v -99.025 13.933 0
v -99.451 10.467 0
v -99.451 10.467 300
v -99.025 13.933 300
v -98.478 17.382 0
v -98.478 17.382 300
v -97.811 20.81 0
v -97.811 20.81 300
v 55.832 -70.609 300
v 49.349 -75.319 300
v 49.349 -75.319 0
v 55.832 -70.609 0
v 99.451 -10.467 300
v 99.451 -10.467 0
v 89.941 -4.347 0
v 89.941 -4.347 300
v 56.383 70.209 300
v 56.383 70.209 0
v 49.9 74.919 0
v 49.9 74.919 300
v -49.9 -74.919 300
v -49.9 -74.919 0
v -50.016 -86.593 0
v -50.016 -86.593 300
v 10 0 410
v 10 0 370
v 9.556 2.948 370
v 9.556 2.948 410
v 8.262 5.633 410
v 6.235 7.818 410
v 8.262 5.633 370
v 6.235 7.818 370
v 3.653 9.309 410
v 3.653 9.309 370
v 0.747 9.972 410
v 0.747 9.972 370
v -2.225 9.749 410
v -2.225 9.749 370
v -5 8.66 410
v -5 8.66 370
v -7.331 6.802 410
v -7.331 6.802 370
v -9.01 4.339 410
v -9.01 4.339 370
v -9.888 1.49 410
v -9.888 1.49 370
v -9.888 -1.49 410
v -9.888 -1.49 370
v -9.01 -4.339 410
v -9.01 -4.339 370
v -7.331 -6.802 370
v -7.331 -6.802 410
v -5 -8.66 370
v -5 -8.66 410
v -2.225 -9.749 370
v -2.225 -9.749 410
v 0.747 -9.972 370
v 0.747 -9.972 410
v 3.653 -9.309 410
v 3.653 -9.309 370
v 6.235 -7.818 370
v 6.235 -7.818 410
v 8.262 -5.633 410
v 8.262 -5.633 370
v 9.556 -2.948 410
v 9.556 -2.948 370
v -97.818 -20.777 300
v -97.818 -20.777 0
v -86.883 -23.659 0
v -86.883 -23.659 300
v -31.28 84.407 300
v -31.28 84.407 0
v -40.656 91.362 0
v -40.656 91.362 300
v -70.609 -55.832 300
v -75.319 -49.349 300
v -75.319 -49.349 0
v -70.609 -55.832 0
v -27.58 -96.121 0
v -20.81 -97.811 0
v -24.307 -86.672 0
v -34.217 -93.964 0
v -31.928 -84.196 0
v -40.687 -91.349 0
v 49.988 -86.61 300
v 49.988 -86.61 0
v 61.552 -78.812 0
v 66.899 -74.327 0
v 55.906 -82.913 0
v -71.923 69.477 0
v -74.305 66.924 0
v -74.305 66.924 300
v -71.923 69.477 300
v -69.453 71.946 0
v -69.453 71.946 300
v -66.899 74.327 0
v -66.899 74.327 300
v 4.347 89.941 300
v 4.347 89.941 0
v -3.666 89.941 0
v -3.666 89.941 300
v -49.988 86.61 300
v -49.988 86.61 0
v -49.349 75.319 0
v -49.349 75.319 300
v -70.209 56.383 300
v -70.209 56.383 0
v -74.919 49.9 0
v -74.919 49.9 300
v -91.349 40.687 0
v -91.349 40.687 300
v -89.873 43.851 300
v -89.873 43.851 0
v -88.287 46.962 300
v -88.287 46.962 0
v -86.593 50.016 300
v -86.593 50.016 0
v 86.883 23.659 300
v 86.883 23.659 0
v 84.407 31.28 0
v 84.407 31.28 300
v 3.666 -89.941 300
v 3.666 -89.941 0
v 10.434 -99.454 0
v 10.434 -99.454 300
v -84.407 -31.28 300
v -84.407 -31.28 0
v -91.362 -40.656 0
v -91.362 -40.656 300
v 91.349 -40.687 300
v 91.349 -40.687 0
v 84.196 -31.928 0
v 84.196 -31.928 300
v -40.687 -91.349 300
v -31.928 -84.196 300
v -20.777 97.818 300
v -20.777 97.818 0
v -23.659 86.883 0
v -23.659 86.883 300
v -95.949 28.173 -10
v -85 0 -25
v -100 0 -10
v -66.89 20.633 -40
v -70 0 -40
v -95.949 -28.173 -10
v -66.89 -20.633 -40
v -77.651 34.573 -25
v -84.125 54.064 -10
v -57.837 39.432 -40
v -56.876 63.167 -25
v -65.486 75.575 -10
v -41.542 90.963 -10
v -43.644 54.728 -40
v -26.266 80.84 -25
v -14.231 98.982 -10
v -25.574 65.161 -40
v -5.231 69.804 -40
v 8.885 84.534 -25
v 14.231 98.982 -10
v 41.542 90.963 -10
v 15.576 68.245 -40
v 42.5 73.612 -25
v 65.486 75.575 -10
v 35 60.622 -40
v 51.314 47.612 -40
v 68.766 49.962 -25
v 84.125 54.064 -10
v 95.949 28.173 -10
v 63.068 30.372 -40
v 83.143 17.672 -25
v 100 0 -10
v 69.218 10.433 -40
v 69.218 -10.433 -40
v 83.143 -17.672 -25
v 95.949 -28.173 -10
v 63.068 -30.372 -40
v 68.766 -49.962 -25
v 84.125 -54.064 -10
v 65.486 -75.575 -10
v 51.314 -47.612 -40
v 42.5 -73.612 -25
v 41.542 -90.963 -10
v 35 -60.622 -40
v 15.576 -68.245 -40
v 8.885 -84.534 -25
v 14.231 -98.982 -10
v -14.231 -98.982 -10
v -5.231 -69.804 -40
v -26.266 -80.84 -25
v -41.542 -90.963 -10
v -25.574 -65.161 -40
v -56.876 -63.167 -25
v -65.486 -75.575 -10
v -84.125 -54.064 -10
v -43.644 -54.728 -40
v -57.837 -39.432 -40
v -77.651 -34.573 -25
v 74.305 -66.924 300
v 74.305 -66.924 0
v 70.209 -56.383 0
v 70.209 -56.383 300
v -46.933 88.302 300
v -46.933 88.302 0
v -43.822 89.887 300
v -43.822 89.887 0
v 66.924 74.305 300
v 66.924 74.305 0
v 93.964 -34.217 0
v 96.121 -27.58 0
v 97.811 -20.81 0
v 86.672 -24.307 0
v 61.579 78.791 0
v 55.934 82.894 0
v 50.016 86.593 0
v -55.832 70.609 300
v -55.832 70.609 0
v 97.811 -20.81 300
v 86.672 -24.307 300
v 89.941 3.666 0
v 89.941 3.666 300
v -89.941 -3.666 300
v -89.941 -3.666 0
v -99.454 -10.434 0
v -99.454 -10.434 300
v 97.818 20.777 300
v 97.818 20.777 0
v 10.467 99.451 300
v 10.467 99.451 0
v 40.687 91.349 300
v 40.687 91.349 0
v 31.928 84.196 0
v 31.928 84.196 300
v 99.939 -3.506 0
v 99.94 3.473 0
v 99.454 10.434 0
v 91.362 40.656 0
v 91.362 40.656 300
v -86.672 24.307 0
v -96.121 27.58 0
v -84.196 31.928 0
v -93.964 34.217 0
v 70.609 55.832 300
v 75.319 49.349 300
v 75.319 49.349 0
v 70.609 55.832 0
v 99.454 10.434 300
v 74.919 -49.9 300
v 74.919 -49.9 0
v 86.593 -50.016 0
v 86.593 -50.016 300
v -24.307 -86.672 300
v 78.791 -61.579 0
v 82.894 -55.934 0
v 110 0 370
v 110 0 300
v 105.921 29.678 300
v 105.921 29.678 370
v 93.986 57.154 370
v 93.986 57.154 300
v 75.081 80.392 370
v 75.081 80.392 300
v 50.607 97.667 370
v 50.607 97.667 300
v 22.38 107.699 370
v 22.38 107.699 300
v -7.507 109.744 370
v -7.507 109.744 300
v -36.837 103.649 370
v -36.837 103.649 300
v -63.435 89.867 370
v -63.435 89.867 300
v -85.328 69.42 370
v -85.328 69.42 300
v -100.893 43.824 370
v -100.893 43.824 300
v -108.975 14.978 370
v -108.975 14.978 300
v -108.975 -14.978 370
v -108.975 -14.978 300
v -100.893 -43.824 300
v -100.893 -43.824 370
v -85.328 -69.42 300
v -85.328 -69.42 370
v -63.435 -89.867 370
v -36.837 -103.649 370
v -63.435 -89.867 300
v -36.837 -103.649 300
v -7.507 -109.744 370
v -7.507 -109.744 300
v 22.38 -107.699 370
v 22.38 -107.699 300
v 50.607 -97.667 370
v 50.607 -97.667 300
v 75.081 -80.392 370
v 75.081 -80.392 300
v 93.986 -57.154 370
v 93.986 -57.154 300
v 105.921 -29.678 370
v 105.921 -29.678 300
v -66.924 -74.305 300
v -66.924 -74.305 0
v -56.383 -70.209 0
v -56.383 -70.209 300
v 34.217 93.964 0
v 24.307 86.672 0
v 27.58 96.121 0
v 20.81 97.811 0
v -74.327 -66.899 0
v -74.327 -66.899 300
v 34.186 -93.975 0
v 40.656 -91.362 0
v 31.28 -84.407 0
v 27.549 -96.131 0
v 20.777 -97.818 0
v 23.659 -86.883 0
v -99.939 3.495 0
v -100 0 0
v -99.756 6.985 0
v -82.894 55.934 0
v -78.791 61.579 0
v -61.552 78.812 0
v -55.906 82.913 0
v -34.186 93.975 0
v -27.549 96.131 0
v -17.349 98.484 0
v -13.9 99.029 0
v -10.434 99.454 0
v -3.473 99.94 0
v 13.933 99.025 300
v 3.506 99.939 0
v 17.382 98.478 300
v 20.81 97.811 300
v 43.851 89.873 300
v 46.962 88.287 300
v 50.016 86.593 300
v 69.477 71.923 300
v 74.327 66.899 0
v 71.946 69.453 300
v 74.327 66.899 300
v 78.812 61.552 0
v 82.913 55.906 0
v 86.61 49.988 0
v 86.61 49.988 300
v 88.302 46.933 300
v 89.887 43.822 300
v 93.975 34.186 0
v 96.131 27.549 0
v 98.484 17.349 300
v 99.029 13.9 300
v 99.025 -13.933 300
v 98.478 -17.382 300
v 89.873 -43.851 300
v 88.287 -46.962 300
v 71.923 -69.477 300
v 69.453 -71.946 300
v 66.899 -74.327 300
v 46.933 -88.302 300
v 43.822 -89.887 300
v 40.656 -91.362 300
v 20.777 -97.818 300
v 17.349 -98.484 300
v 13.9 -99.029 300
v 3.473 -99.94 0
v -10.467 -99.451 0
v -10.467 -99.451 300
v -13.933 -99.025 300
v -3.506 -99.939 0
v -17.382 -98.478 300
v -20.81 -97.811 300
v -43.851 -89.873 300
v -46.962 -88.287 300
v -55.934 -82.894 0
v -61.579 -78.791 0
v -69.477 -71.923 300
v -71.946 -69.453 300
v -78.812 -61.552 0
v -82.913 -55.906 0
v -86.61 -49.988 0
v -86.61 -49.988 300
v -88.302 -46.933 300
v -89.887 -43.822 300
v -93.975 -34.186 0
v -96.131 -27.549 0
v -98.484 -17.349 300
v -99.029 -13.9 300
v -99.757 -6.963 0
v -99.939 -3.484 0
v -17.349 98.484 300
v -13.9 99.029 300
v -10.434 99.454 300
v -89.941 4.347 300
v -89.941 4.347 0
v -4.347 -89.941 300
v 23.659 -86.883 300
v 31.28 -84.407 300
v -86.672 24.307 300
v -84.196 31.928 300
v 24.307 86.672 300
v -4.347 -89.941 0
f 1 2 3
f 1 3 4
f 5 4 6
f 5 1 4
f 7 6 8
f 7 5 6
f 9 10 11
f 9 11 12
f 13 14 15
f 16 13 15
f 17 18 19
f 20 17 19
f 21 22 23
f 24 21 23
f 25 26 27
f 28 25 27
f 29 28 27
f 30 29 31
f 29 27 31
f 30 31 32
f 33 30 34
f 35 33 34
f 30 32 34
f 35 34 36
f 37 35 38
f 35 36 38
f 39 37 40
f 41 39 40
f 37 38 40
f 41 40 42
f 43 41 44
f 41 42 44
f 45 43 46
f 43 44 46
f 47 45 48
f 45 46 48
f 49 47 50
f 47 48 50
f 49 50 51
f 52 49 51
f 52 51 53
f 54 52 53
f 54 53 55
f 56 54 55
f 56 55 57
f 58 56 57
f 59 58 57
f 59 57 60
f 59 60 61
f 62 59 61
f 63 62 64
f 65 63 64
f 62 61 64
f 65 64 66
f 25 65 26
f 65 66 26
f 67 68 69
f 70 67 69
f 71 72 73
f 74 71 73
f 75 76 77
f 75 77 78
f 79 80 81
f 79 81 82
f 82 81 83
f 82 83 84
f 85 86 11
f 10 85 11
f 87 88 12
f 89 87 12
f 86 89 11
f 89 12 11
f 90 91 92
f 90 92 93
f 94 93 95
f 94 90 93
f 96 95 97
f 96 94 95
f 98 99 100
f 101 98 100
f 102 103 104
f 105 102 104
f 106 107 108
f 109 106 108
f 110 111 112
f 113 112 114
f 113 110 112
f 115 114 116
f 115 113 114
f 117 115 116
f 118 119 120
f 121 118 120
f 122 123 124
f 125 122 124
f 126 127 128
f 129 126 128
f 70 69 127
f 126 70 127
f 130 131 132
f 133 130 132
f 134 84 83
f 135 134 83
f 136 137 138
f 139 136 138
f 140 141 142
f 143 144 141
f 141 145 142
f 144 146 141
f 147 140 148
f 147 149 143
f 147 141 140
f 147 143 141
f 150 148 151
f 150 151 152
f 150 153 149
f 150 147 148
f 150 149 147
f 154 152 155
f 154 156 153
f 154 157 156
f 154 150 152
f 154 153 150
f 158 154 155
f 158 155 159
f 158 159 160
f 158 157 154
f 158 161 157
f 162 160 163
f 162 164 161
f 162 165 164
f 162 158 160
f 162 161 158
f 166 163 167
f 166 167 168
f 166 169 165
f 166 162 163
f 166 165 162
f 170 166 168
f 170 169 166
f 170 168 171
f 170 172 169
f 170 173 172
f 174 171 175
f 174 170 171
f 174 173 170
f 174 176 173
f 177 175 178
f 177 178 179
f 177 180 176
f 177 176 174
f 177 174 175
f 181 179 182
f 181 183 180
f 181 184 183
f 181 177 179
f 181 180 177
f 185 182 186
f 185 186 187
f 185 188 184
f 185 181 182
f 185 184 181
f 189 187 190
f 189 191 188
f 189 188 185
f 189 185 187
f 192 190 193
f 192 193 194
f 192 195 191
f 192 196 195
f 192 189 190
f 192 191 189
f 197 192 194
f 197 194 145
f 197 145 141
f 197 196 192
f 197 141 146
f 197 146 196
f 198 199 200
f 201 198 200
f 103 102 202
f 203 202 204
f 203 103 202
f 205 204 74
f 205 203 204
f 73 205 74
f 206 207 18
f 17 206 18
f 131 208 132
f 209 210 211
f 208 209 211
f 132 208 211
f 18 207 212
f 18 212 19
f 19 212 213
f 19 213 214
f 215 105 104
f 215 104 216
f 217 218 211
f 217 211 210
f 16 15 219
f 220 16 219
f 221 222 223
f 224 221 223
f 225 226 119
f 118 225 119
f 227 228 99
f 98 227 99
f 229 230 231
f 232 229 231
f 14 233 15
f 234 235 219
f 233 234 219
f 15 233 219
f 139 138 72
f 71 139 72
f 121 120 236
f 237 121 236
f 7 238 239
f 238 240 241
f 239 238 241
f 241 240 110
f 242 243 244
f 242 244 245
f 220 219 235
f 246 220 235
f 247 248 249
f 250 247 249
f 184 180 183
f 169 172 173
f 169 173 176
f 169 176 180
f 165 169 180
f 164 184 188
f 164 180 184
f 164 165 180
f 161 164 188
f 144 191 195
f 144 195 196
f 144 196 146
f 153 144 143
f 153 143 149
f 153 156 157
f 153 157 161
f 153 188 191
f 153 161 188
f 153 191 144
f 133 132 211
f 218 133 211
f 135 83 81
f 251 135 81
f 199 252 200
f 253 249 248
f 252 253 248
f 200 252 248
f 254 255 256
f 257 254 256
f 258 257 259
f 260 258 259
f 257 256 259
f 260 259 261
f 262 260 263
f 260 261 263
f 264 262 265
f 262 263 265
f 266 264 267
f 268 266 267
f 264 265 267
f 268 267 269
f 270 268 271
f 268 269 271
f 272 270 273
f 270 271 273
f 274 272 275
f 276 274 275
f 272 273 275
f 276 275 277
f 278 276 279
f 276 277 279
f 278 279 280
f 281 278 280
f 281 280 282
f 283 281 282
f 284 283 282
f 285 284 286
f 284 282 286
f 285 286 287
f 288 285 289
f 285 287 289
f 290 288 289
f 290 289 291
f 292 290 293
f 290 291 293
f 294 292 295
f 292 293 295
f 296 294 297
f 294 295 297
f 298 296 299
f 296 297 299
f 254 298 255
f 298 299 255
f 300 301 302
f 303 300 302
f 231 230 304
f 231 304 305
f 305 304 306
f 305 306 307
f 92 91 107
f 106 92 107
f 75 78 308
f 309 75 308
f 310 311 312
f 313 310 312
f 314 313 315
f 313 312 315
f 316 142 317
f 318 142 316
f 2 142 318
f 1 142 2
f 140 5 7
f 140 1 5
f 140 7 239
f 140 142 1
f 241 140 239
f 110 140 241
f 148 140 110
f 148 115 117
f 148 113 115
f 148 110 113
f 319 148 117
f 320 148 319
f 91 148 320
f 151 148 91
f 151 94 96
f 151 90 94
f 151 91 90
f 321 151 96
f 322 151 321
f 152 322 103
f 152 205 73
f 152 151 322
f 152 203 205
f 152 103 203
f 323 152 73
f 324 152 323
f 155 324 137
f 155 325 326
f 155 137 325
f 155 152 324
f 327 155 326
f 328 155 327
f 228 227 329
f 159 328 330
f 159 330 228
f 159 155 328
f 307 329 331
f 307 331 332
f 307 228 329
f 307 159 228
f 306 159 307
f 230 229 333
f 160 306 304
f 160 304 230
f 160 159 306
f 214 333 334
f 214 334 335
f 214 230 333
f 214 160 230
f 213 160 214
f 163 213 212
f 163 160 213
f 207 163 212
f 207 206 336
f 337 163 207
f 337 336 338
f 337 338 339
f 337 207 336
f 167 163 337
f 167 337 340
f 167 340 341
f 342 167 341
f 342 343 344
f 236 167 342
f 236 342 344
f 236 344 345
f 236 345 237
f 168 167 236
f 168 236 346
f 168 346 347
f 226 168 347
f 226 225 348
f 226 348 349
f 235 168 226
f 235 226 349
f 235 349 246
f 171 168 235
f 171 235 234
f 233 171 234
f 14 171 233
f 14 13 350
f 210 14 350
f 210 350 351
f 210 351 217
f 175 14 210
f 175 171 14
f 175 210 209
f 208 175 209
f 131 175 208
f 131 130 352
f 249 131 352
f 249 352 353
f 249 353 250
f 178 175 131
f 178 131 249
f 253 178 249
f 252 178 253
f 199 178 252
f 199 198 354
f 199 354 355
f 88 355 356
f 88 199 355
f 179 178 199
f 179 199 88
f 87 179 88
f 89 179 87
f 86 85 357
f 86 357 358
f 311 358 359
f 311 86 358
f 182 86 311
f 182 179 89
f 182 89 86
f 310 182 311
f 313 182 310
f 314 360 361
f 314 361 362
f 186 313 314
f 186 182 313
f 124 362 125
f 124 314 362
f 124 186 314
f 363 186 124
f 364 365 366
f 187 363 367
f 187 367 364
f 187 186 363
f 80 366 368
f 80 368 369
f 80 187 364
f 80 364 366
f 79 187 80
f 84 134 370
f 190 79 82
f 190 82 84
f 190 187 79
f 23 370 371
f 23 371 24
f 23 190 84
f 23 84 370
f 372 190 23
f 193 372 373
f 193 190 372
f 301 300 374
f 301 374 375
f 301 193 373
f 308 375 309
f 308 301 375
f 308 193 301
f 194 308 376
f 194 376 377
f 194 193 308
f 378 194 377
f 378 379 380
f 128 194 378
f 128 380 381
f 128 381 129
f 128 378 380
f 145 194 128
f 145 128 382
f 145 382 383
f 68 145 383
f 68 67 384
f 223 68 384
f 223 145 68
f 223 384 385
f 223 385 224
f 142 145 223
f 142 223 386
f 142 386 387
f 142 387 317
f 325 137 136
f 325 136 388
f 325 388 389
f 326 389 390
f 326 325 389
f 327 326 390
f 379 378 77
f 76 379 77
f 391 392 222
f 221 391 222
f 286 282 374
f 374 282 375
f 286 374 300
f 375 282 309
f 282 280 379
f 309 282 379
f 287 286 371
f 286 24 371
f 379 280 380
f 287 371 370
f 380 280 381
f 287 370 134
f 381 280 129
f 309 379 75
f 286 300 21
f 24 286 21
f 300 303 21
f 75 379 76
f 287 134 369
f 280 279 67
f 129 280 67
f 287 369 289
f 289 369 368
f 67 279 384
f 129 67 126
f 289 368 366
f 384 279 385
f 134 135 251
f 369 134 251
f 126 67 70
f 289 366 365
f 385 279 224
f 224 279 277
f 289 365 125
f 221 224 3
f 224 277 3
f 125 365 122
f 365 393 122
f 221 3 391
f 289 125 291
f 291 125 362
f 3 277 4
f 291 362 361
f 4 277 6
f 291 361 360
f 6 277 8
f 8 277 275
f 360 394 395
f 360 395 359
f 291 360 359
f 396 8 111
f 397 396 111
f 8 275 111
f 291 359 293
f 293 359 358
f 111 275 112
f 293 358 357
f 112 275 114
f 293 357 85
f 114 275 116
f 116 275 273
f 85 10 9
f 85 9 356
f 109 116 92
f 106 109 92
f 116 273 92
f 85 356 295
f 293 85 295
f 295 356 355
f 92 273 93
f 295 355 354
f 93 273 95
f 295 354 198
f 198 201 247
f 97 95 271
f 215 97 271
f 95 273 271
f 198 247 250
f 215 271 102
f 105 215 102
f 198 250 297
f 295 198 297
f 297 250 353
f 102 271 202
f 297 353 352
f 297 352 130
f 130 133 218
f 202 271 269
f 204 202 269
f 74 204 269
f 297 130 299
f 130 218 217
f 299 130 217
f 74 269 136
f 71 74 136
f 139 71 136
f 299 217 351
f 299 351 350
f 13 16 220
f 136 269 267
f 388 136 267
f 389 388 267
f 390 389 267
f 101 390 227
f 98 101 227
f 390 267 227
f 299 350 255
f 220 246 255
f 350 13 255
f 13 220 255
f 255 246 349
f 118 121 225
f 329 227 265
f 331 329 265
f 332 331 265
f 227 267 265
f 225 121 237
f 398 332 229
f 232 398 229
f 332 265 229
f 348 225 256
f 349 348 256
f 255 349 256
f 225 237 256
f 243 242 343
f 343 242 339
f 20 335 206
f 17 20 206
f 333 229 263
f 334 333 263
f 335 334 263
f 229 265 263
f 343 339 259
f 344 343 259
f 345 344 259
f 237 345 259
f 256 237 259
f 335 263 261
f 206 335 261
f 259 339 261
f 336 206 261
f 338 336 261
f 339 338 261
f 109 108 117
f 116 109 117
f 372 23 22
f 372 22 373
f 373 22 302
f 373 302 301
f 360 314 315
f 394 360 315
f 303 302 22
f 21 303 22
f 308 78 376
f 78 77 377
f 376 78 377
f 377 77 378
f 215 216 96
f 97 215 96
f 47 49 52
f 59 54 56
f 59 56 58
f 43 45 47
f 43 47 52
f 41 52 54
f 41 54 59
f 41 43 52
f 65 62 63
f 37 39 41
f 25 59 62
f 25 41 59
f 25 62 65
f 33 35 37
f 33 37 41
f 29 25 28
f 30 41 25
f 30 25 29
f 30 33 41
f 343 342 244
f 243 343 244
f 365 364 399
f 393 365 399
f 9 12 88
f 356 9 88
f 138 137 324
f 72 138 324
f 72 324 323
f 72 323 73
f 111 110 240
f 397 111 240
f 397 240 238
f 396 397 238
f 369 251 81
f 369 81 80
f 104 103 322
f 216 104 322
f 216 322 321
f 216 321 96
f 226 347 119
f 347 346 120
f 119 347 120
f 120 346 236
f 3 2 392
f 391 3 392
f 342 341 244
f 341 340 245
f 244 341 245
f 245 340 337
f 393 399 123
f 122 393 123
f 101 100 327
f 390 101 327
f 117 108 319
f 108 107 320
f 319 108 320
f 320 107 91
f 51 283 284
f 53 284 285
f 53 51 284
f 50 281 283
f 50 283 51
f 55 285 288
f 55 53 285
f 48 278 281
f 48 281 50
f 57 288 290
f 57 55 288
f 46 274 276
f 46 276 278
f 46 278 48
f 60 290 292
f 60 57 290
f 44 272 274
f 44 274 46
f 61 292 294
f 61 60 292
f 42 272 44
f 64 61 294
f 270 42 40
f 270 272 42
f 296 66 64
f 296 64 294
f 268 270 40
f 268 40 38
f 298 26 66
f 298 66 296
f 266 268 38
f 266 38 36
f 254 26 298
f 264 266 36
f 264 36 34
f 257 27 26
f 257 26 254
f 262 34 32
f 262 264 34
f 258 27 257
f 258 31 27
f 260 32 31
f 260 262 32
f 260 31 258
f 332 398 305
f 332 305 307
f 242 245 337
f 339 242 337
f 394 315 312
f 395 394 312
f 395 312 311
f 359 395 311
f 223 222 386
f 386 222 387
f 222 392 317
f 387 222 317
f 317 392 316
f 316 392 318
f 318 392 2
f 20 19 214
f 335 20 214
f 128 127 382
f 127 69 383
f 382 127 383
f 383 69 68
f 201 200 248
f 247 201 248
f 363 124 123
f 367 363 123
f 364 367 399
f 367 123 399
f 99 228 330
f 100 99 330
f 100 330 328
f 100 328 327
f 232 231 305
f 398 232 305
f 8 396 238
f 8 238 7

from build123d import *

# Parameters (mm, degrees)
SKETCH1_R           = 100
BOSS_EXTRUDE1_DEPTH = 300
CUT_EXTRUDE1_REACH  = 333.662
BOSS_EXTRUDE3_START = 40
SKETCH4_R           = 100
BOSS_EXTRUDE3_DEPTH = 40
CHAMFER1_SIZE       = 30
SKETCH5_R           = 110
BOSS_EXTRUDE4_DEPTH = 70
SKETCH6_R           = 10
BOSS_EXTRUDE5_DEPTH = 40


with BuildPart() as part:
    # Sketch1 → Boss-Extrude1 (new body)
    with BuildSketch(Plane.XY):
        Circle(SKETCH1_R)
    extrude(amount=BOSS_EXTRUDE1_DEPTH)

    # Sketch3 → Cut-Extrude1 (cut, up to next)
    with BuildSketch(Plane(origin=(0, 0, 0), x_dir=(-1, 0, 0), z_dir=(0, 0, -1)), mode=Mode.PRIVATE) as cut_extrude1_sk1:
        with BuildLine():
            Line((-10.46691071, 99.450710305), (-4.346948216, 89.941443019))
            Line((-4.346948216, 89.941443019), (3.66602129, 89.941443019))
            Line((3.66602129, 89.941443019), (10.434028252, 99.454165596))
            ThreePointArc((10.434028252, 99.454165596), (-0.01653175, 99.999998634), (-10.46691071, 99.450710305))
        make_face()
    cut_extrude1_tool1 = extrude(cut_extrude1_sk1.sketch, amount=-CUT_EXTRUDE1_REACH, mode=Mode.PRIVATE) & part.part
    # Sketch3 → Cut-Extrude1 (cut, up to next)
    with BuildSketch(Plane(origin=(0, 0, 0), x_dir=(-1, 0, 0), z_dir=(0, 0, -1)), mode=Mode.PRIVATE) as cut_extrude1_sk2:
        with BuildLine():
            Line((20.777335951, 97.817699374), (23.659240965, 86.88267634))
            Line((23.659240965, 86.88267634), (31.280027828, 84.406532588))
            Line((31.280027828, 84.406532588), (40.656377891, 91.362240213))
            ThreePointArc((40.656377891, 91.362240213), (30.885976386, 95.110758922), (20.777335951, 97.817699374))
        make_face()
    cut_extrude1_tool2 = extrude(cut_extrude1_sk2.sketch, amount=-CUT_EXTRUDE1_REACH, mode=Mode.PRIVATE) & part.part
    # Sketch3 → Cut-Extrude1 (cut, up to next)
    with BuildSketch(Plane(origin=(0, 0, 0), x_dir=(-1, 0, 0), z_dir=(0, 0, -1)), mode=Mode.PRIVATE) as cut_extrude1_sk3:
        with BuildLine():
            Line((49.987752204, 86.609610492), (49.349498796, 75.319227955))
            Line((49.349498796, 75.319227955), (55.832127301, 70.609322652))
            Line((55.832127301, 70.609322652), (66.898997992, 74.3271422))
            ThreePointArc((66.898997992, 74.3271422), (58.765149959, 80.911415451), (49.987752204, 86.609610492))
        make_face()
    cut_extrude1_tool3 = extrude(cut_extrude1_sk3.sketch, amount=-CUT_EXTRUDE1_REACH, mode=Mode.PRIVATE) & part.part
    # Sketch3 → Cut-Extrude1 (cut, up to next)
    with BuildSketch(Plane(origin=(0, 0, 0), x_dir=(-1, 0, 0), z_dir=(0, 0, -1)), mode=Mode.PRIVATE) as cut_extrude1_sk4:
        with BuildLine():
            Line((74.305018987, 66.92356949), (70.209083847, 56.383008757))
            Line((70.209083847, 56.383008757), (74.918989149, 49.900380251))
            Line((74.918989149, 49.900380251), (86.593078057, 50.016385641))
            ThreePointArc((86.593078057, 50.016385641), (80.891981213, 58.791898893), (74.305018987, 66.92356949))
        make_face()
    cut_extrude1_tool4 = extrude(cut_extrude1_sk4.sketch, amount=-CUT_EXTRUDE1_REACH, mode=Mode.PRIVATE) & part.part
    # Sketch3 → Cut-Extrude1 (cut, up to next)
    with BuildSketch(Plane(origin=(0, 0, 0), x_dir=(-1, 0, 0), z_dir=(0, 0, -1)), mode=Mode.PRIVATE) as cut_extrude1_sk5:
        with BuildLine():
            Line((91.348792798, 40.686583223), (84.196114596, 31.927627818))
            Line((84.196114596, 31.927627818), (86.672258348, 24.306840955))
            Line((86.672258348, 24.306840955), (97.810824313, 20.80967677))
            ThreePointArc((97.810824313, 20.80967677), (95.100541738, 30.917421644), (91.348792798, 40.686583223))
        make_face()
    cut_extrude1_tool5 = extrude(cut_extrude1_sk5.sketch, amount=-CUT_EXTRUDE1_REACH, mode=Mode.PRIVATE) & part.part
    # Sketch3 → Cut-Extrude1 (cut, up to next)
    with BuildSketch(Plane(origin=(0, 0, 0), x_dir=(-1, 0, 0), z_dir=(0, 0, -1)), mode=Mode.PRIVATE) as cut_extrude1_sk6:
        with BuildLine():
            Line((99.450710305, 10.46691071), (89.941443019, 4.346948216))
            Line((89.941443019, 4.346948216), (89.941443019, -3.66602129))
            Line((89.941443019, -3.66602129), (99.454165596, -10.434028252))
            ThreePointArc((99.454165596, -10.434028252), (99.999998634, 0.01653175), (99.450710305, 10.46691071))
        make_face()
    cut_extrude1_tool6 = extrude(cut_extrude1_sk6.sketch, amount=-CUT_EXTRUDE1_REACH, mode=Mode.PRIVATE) & part.part
    # Sketch3 → Cut-Extrude1 (cut, up to next)
    with BuildSketch(Plane(origin=(0, 0, 0), x_dir=(-1, 0, 0), z_dir=(0, 0, -1)), mode=Mode.PRIVATE) as cut_extrude1_sk7:
        with BuildLine():
            Line((97.817699374, -20.777335951), (86.88267634, -23.659240965))
            Line((86.88267634, -23.659240965), (84.406532588, -31.280027828))
            Line((84.406532588, -31.280027828), (91.362240213, -40.656377891))
            ThreePointArc((91.362240213, -40.656377891), (95.110758922, -30.885976386), (97.817699374, -20.777335951))
        make_face()
    cut_extrude1_tool7 = extrude(cut_extrude1_sk7.sketch, amount=-CUT_EXTRUDE1_REACH, mode=Mode.PRIVATE) & part.part
    # Sketch3 → Cut-Extrude1 (cut, up to next)
    with BuildSketch(Plane(origin=(0, 0, 0), x_dir=(-1, 0, 0), z_dir=(0, 0, -1)), mode=Mode.PRIVATE) as cut_extrude1_sk8:
        with BuildLine():
            Line((86.609610492, -49.987752204), (75.319227955, -49.349498796))
            Line((75.319227955, -49.349498796), (70.609322652, -55.832127301))
            Line((70.609322652, -55.832127301), (74.3271422, -66.898997992))
            ThreePointArc((74.3271422, -66.898997992), (80.911415451, -58.765149959), (86.609610492, -49.987752204))
        make_face()
    cut_extrude1_tool8 = extrude(cut_extrude1_sk8.sketch, amount=-CUT_EXTRUDE1_REACH, mode=Mode.PRIVATE) & part.part
    # Sketch3 → Cut-Extrude1 (cut, up to next)
    with BuildSketch(Plane(origin=(0, 0, 0), x_dir=(-1, 0, 0), z_dir=(0, 0, -1)), mode=Mode.PRIVATE) as cut_extrude1_sk9:
        with BuildLine():
            Line((66.92356949, -74.305018987), (56.383008757, -70.209083847))
            Line((56.383008757, -70.209083847), (49.900380251, -74.918989149))
            Line((49.900380251, -74.918989149), (50.016385641, -86.593078057))
            ThreePointArc((50.016385641, -86.593078057), (58.791898893, -80.891981213), (66.92356949, -74.305018987))
        make_face()
    cut_extrude1_tool9 = extrude(cut_extrude1_sk9.sketch, amount=-CUT_EXTRUDE1_REACH, mode=Mode.PRIVATE) & part.part
    # Sketch3 → Cut-Extrude1 (cut, up to next)
    with BuildSketch(Plane(origin=(0, 0, 0), x_dir=(-1, 0, 0), z_dir=(0, 0, -1)), mode=Mode.PRIVATE) as cut_extrude1_sk10:
        with BuildLine():
            Line((40.686583223, -91.348792798), (31.927627818, -84.196114596))
            Line((31.927627818, -84.196114596), (24.306840955, -86.672258348))
            Line((24.306840955, -86.672258348), (20.80967677, -97.810824313))
            ThreePointArc((20.80967677, -97.810824313), (30.917421644, -95.100541738), (40.686583223, -91.348792798))
        make_face()
    cut_extrude1_tool10 = extrude(cut_extrude1_sk10.sketch, amount=-CUT_EXTRUDE1_REACH, mode=Mode.PRIVATE) & part.part
    # Sketch3 → Cut-Extrude1 (cut, up to next)
    with BuildSketch(Plane(origin=(0, 0, 0), x_dir=(-1, 0, 0), z_dir=(0, 0, -1)), mode=Mode.PRIVATE) as cut_extrude1_sk11:
        with BuildLine():
            Line((10.46691071, -99.450710305), (4.346948216, -89.941443019))
            Line((4.346948216, -89.941443019), (-3.66602129, -89.941443019))
            Line((-3.66602129, -89.941443019), (-10.434028252, -99.454165596))
            ThreePointArc((-10.434028252, -99.454165596), (0.01653175, -99.999998634), (10.46691071, -99.450710305))
        make_face()
    cut_extrude1_tool11 = extrude(cut_extrude1_sk11.sketch, amount=-CUT_EXTRUDE1_REACH, mode=Mode.PRIVATE) & part.part
    # Sketch3 → Cut-Extrude1 (cut, up to next)
    with BuildSketch(Plane(origin=(0, 0, 0), x_dir=(-1, 0, 0), z_dir=(0, 0, -1)), mode=Mode.PRIVATE) as cut_extrude1_sk12:
        with BuildLine():
            Line((-20.777335951, -97.817699374), (-23.659240965, -86.88267634))
            Line((-23.659240965, -86.88267634), (-31.280027828, -84.406532588))
            Line((-31.280027828, -84.406532588), (-40.656377891, -91.362240213))
            ThreePointArc((-40.656377891, -91.362240213), (-30.885976386, -95.110758922), (-20.777335951, -97.817699374))
        make_face()
    cut_extrude1_tool12 = extrude(cut_extrude1_sk12.sketch, amount=-CUT_EXTRUDE1_REACH, mode=Mode.PRIVATE) & part.part
    # Sketch3 → Cut-Extrude1 (cut, up to next)
    with BuildSketch(Plane(origin=(0, 0, 0), x_dir=(-1, 0, 0), z_dir=(0, 0, -1)), mode=Mode.PRIVATE) as cut_extrude1_sk13:
        with BuildLine():
            Line((-49.987752204, -86.609610492), (-49.349498796, -75.319227955))
            Line((-49.349498796, -75.319227955), (-55.832127301, -70.609322652))
            Line((-55.832127301, -70.609322652), (-66.898997992, -74.3271422))
            ThreePointArc((-66.898997992, -74.3271422), (-58.765149959, -80.911415451), (-49.987752204, -86.609610492))
        make_face()
    cut_extrude1_tool13 = extrude(cut_extrude1_sk13.sketch, amount=-CUT_EXTRUDE1_REACH, mode=Mode.PRIVATE) & part.part
    # Sketch3 → Cut-Extrude1 (cut, up to next)
    with BuildSketch(Plane(origin=(0, 0, 0), x_dir=(-1, 0, 0), z_dir=(0, 0, -1)), mode=Mode.PRIVATE) as cut_extrude1_sk14:
        with BuildLine():
            Line((-74.305018987, -66.92356949), (-70.209083847, -56.383008757))
            Line((-70.209083847, -56.383008757), (-74.918989149, -49.900380251))
            Line((-74.918989149, -49.900380251), (-86.593078057, -50.016385641))
            ThreePointArc((-86.593078057, -50.016385641), (-80.891981213, -58.791898893), (-74.305018987, -66.92356949))
        make_face()
    cut_extrude1_tool14 = extrude(cut_extrude1_sk14.sketch, amount=-CUT_EXTRUDE1_REACH, mode=Mode.PRIVATE) & part.part
    # Sketch3 → Cut-Extrude1 (cut, up to next)
    with BuildSketch(Plane(origin=(0, 0, 0), x_dir=(-1, 0, 0), z_dir=(0, 0, -1)), mode=Mode.PRIVATE) as cut_extrude1_sk15:
        with BuildLine():
            Line((-91.348792798, -40.686583223), (-84.196114596, -31.927627818))
            Line((-84.196114596, -31.927627818), (-86.672258348, -24.306840955))
            Line((-86.672258348, -24.306840955), (-97.810824313, -20.80967677))
            ThreePointArc((-97.810824313, -20.80967677), (-95.100541738, -30.917421644), (-91.348792798, -40.686583223))
        make_face()
    cut_extrude1_tool15 = extrude(cut_extrude1_sk15.sketch, amount=-CUT_EXTRUDE1_REACH, mode=Mode.PRIVATE) & part.part
    # Sketch3 → Cut-Extrude1 (cut, up to next)
    with BuildSketch(Plane(origin=(0, 0, 0), x_dir=(-1, 0, 0), z_dir=(0, 0, -1)), mode=Mode.PRIVATE) as cut_extrude1_sk16:
        with BuildLine():
            Line((-99.450710305, -10.46691071), (-89.941443019, -4.346948216))
            Line((-89.941443019, -4.346948216), (-89.941443019, 3.66602129))
            Line((-89.941443019, 3.66602129), (-99.454165596, 10.434028252))
            ThreePointArc((-99.454165596, 10.434028252), (-99.999998634, -0.01653175), (-99.450710305, -10.46691071))
        make_face()
    cut_extrude1_tool16 = extrude(cut_extrude1_sk16.sketch, amount=-CUT_EXTRUDE1_REACH, mode=Mode.PRIVATE) & part.part
    # Sketch3 → Cut-Extrude1 (cut, up to next)
    with BuildSketch(Plane(origin=(0, 0, 0), x_dir=(-1, 0, 0), z_dir=(0, 0, -1)), mode=Mode.PRIVATE) as cut_extrude1_sk17:
        with BuildLine():
            Line((-97.817699374, 20.777335951), (-86.88267634, 23.659240965))
            Line((-86.88267634, 23.659240965), (-84.406532588, 31.280027828))
            Line((-84.406532588, 31.280027828), (-91.362240213, 40.656377891))
            ThreePointArc((-91.362240213, 40.656377891), (-95.110758922, 30.885976386), (-97.817699374, 20.777335951))
        make_face()
    cut_extrude1_tool17 = extrude(cut_extrude1_sk17.sketch, amount=-CUT_EXTRUDE1_REACH, mode=Mode.PRIVATE) & part.part
    # Sketch3 → Cut-Extrude1 (cut, up to next)
    with BuildSketch(Plane(origin=(0, 0, 0), x_dir=(-1, 0, 0), z_dir=(0, 0, -1)), mode=Mode.PRIVATE) as cut_extrude1_sk18:
        with BuildLine():
            Line((-86.609610492, 49.987752204), (-75.319227955, 49.349498796))
            Line((-75.319227955, 49.349498796), (-70.609322652, 55.832127301))
            Line((-70.609322652, 55.832127301), (-74.3271422, 66.898997992))
            ThreePointArc((-74.3271422, 66.898997992), (-80.911415451, 58.765149959), (-86.609610492, 49.987752204))
        make_face()
    cut_extrude1_tool18 = extrude(cut_extrude1_sk18.sketch, amount=-CUT_EXTRUDE1_REACH, mode=Mode.PRIVATE) & part.part
    # Sketch3 → Cut-Extrude1 (cut, up to next)
    with BuildSketch(Plane(origin=(0, 0, 0), x_dir=(-1, 0, 0), z_dir=(0, 0, -1)), mode=Mode.PRIVATE) as cut_extrude1_sk19:
        with BuildLine():
            Line((-66.92356949, 74.305018987), (-56.383008757, 70.209083847))
            Line((-56.383008757, 70.209083847), (-49.900380251, 74.918989149))
            Line((-49.900380251, 74.918989149), (-50.016385641, 86.593078057))
            ThreePointArc((-50.016385641, 86.593078057), (-58.791898893, 80.891981213), (-66.92356949, 74.305018987))
        make_face()
    cut_extrude1_tool19 = extrude(cut_extrude1_sk19.sketch, amount=-CUT_EXTRUDE1_REACH, mode=Mode.PRIVATE) & part.part
    # Sketch3 → Cut-Extrude1 (cut, up to next)
    with BuildSketch(Plane(origin=(0, 0, 0), x_dir=(-1, 0, 0), z_dir=(0, 0, -1)), mode=Mode.PRIVATE) as cut_extrude1_sk20:
        with BuildLine():
            Line((-40.686583223, 91.348792798), (-31.927627818, 84.196114596))
            Line((-31.927627818, 84.196114596), (-24.306840955, 86.672258348))
            Line((-24.306840955, 86.672258348), (-20.80967677, 97.810824313))
            ThreePointArc((-20.80967677, 97.810824313), (-30.917421644, 95.100541738), (-40.686583223, 91.348792798))
        make_face()
    cut_extrude1_tool20 = extrude(cut_extrude1_sk20.sketch, amount=-CUT_EXTRUDE1_REACH, mode=Mode.PRIVATE) & part.part
    add(cut_extrude1_tool1.solids().sort_by_distance((0.146898, 95.627996, 0))[0], mode=Mode.SUBTRACT)
    add(cut_extrude1_tool2.solids().sort_by_distance((-29.410968, 90.993022, 0))[0], mode=Mode.SUBTRACT)
    add(cut_extrude1_tool3.solids().sort_by_distance((-56.089883, 77.451018, 0))[0], mode=Mode.SUBTRACT)
    add(cut_extrude1_tool4.solids().sort_by_distance((-77.278329, 56.327568, 0))[0], mode=Mode.SUBTRACT)
    add(cut_extrude1_tool5.solids().sort_by_distance((-90.902235, 29.690384, 0))[0], mode=Mode.SUBTRACT)
    add(cut_extrude1_tool6.solids().sort_by_distance((-95.627996, 0.146898, 0))[0], mode=Mode.SUBTRACT)
    add(cut_extrude1_tool7.solids().sort_by_distance((-90.993022, -29.410968, 0))[0], mode=Mode.SUBTRACT)
    add(cut_extrude1_tool8.solids().sort_by_distance((-77.451018, -56.089883, 0))[0], mode=Mode.SUBTRACT)
    add(cut_extrude1_tool9.solids().sort_by_distance((-56.327568, -77.278329, 0))[0], mode=Mode.SUBTRACT)
    add(cut_extrude1_tool10.solids().sort_by_distance((-29.690384, -90.902235, 0))[0], mode=Mode.SUBTRACT)
    add(cut_extrude1_tool11.solids().sort_by_distance((-0.146898, -95.627996, 0))[0], mode=Mode.SUBTRACT)
    add(cut_extrude1_tool12.solids().sort_by_distance((29.410968, -90.993022, 0))[0], mode=Mode.SUBTRACT)
    add(cut_extrude1_tool13.solids().sort_by_distance((56.089883, -77.451018, 0))[0], mode=Mode.SUBTRACT)
    add(cut_extrude1_tool14.solids().sort_by_distance((77.278329, -56.327568, 0))[0], mode=Mode.SUBTRACT)
    add(cut_extrude1_tool15.solids().sort_by_distance((90.902235, -29.690384, 0))[0], mode=Mode.SUBTRACT)
    add(cut_extrude1_tool16.solids().sort_by_distance((95.627996, -0.146898, 0))[0], mode=Mode.SUBTRACT)
    add(cut_extrude1_tool17.solids().sort_by_distance((90.993022, 29.410968, 0))[0], mode=Mode.SUBTRACT)
    add(cut_extrude1_tool18.solids().sort_by_distance((77.451018, 56.089883, 0))[0], mode=Mode.SUBTRACT)
    add(cut_extrude1_tool19.solids().sort_by_distance((56.327568, 77.278329, 0))[0], mode=Mode.SUBTRACT)
    add(cut_extrude1_tool20.solids().sort_by_distance((29.690384, 90.902235, 0))[0], mode=Mode.SUBTRACT)

    # Sketch4 → Boss-Extrude3 (add)
    with BuildSketch(Plane(origin=(0, 0, 0), x_dir=(-1, 0, 0), z_dir=(0, 0, -1)).offset(BOSS_EXTRUDE3_START)):
        Circle(SKETCH4_R)
    extrude(amount=-BOSS_EXTRUDE3_DEPTH)

    # Chamfer1
    chamfer1_edges = [part.edges().sort_by_distance(p)[0] for p in [
        (100, 0, -40),
    ]]
    chamfer(chamfer1_edges, length=CHAMFER1_SIZE)

    # Sketch5 → Boss-Extrude4 (add)
    with BuildSketch(Plane.XY.offset(300)):
        Circle(SKETCH5_R)
    extrude(amount=BOSS_EXTRUDE4_DEPTH)

    # Sketch6 → Boss-Extrude5 (add)
    with BuildSketch(Plane.XY.offset(370)):
        Circle(SKETCH6_R)
    extrude(amount=BOSS_EXTRUDE5_DEPTH)


solid = part.part
